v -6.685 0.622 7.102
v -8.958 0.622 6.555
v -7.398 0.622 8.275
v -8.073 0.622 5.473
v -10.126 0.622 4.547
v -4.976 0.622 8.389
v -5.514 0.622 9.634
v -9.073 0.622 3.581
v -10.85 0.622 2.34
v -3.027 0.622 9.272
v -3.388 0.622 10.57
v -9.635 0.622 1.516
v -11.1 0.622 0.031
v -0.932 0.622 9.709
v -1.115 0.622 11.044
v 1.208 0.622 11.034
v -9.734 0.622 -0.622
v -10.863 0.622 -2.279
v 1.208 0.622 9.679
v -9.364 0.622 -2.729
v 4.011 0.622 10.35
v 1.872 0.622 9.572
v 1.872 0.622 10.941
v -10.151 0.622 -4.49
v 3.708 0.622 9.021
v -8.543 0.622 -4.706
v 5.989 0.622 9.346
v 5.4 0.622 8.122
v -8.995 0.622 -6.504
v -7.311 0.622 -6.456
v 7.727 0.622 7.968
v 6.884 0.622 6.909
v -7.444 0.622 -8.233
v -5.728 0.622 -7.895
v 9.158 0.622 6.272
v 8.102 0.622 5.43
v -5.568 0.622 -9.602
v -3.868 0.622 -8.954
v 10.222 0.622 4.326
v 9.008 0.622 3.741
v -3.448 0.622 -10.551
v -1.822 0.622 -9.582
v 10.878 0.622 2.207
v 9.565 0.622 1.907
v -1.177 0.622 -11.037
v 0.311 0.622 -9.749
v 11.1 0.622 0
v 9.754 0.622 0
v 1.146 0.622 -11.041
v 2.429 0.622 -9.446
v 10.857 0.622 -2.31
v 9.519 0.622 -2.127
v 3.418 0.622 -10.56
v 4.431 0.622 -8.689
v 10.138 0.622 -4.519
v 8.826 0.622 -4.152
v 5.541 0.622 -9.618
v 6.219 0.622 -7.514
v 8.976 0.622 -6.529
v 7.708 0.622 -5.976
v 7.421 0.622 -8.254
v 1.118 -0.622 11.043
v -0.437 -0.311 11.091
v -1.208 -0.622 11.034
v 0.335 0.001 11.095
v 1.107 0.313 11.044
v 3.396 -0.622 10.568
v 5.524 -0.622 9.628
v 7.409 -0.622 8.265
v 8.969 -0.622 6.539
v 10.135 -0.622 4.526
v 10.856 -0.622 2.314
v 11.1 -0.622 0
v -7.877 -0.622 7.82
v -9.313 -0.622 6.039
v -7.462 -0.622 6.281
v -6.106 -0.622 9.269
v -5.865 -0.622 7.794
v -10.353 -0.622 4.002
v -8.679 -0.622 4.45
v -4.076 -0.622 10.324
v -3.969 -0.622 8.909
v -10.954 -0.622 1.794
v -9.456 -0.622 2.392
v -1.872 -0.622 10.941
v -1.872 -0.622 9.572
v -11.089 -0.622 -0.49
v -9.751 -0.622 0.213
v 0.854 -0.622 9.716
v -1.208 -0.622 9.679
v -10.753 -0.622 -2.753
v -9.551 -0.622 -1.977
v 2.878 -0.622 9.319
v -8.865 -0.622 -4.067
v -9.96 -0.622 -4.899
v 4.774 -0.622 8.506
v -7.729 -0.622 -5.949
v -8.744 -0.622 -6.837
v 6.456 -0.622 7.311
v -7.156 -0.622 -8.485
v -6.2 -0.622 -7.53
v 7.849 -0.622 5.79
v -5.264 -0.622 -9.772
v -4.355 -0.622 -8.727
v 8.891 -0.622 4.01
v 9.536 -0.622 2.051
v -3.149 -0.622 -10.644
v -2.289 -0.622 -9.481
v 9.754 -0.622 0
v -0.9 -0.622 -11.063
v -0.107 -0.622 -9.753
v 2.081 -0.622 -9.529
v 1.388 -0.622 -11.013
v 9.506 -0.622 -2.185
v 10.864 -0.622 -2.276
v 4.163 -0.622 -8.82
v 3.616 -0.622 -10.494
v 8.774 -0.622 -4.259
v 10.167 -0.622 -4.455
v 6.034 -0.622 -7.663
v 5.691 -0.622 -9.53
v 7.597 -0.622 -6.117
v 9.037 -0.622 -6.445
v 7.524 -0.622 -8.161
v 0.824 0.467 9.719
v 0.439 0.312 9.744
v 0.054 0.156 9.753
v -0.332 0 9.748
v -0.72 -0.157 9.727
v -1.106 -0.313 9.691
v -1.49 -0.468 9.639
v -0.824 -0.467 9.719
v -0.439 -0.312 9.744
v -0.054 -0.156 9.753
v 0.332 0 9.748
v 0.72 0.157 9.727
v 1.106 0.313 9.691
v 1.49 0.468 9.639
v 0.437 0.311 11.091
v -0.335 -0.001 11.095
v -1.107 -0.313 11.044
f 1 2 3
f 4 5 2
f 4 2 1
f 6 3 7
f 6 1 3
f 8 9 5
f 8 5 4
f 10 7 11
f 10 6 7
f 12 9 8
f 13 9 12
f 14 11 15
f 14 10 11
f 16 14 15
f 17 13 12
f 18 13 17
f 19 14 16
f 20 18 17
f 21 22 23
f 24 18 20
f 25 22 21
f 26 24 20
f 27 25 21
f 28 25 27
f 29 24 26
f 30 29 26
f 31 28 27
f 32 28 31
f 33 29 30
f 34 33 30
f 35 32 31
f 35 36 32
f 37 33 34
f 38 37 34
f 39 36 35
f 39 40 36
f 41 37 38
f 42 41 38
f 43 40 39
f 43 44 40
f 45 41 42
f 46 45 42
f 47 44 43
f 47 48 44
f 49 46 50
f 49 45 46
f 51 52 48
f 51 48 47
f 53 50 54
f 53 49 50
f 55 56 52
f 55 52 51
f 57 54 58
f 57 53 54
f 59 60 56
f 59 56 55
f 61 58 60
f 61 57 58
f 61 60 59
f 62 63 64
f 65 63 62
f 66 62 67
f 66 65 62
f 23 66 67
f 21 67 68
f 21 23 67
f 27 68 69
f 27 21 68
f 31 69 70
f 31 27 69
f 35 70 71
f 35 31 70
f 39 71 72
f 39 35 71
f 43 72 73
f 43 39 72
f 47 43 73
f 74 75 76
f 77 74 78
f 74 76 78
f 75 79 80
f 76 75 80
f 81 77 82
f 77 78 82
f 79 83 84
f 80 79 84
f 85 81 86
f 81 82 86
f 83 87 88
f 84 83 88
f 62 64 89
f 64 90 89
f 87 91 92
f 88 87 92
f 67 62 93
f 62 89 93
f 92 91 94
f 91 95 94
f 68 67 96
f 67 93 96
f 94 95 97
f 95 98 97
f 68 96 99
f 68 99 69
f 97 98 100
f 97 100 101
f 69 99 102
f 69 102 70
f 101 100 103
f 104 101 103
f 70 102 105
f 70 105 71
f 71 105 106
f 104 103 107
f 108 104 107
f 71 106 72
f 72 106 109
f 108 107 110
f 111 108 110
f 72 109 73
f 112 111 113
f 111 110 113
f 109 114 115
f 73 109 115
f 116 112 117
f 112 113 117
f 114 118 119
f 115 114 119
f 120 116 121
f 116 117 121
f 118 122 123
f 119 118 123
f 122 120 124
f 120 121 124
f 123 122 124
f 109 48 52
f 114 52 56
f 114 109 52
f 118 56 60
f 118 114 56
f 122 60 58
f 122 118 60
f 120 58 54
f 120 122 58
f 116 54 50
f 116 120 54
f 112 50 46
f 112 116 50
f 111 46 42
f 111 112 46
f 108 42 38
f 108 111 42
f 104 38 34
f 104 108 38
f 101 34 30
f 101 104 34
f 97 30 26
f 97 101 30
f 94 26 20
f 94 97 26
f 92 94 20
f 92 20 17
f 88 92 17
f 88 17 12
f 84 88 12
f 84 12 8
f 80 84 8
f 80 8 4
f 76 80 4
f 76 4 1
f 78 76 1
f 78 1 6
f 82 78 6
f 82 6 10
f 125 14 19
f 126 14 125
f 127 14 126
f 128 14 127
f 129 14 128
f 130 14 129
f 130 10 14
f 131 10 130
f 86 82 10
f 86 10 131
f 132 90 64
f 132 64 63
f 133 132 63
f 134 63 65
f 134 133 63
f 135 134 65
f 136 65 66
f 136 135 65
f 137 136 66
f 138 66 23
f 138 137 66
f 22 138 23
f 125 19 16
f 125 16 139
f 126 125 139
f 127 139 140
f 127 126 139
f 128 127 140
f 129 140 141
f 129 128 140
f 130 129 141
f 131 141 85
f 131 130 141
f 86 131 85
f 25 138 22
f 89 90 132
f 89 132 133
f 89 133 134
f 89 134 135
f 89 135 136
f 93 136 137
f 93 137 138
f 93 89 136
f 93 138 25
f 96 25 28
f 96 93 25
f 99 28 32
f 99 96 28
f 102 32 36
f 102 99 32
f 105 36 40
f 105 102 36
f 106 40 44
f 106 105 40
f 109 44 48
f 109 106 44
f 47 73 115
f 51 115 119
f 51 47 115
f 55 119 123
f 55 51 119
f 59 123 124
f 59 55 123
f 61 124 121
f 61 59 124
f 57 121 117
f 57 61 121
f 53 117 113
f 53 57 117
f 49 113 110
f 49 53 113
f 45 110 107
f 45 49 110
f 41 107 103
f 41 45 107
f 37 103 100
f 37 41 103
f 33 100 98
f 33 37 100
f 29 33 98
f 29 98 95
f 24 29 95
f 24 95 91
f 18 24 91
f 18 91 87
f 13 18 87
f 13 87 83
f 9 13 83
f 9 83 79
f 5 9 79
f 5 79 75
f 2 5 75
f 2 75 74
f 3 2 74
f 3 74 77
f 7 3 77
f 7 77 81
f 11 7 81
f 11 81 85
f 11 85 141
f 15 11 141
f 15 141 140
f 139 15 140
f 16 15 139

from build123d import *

# Parameters (mm, degrees)
SKETCH3_R                = 11.0998
SKETCH3_R_2              = 9.7536
BOSS_EXTRUDE1_DEPTH      = 0.6223
BOSS_EXTRUDE1_DEPTH_BACK = 0.6223
CUT_EXTRUDE1_DEPTH       = 12.0998


with BuildPart() as part:
    # Sketch3 → Boss-Extrude1 (new body, two sides)
    with BuildSketch(Plane(origin=(0, 0, 0), x_dir=(1, 0, 0), z_dir=(0, 1, 0))) as boss_extrude1_sk:
        Circle(SKETCH3_R)
        Circle(SKETCH3_R_2, mode=Mode.SUBTRACT)
    extrude(amount=BOSS_EXTRUDE1_DEPTH)
    extrude(boss_extrude1_sk.sketch, amount=-BOSS_EXTRUDE1_DEPTH_BACK)

    # Sketch4 → Cut-Extrude1 (cut, through all)
    with BuildSketch(Plane.XY):
        Polygon((2.838309027, 1.280985718), (-2.9315561, -1.050191113), (-2.838309027, -1.280985718), (2.9315561, 1.050191113), align=None)
    extrude(amount=CUT_EXTRUDE1_DEPTH, mode=Mode.SUBTRACT)


solid = part.part
